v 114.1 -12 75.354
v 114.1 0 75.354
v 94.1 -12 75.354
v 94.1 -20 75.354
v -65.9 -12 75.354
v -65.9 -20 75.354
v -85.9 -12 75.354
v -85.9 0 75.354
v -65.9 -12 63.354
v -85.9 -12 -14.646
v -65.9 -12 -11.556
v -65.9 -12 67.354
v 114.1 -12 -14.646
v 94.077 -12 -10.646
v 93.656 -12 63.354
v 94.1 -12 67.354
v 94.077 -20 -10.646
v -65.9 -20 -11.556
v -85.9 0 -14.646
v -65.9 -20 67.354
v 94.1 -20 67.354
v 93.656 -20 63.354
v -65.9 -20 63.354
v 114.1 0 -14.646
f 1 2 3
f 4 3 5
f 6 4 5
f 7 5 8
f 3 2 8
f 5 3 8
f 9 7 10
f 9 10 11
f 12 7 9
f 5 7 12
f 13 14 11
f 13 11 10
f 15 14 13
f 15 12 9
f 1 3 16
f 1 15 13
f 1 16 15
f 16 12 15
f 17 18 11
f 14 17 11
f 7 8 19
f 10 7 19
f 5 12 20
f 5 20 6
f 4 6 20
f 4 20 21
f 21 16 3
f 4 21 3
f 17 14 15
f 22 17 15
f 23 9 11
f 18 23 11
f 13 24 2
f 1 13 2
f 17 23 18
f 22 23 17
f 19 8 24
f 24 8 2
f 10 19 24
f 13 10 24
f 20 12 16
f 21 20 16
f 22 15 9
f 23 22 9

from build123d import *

# Parameters (mm, degrees)
F0_W     = 160
F0_H     = 8
F1_DEPTH = 12
F2_DEPTH = 20
F3_W     = 8
F3_H     = 4
F4_DEPTH = 159.9984091469


with BuildPart() as f1:
    # F0 (on Front) → F1 (new body)
    with BuildSketch(Plane.XZ):
        Polygon((-65.9003738091, 63.3540591938), (-65.9003738091, -14.6459408062), (94.0996261909, -14.6459408062), (93.6557352543, 63.3540591938), align=None)
        Polygon((-85.9003738091, -14.6459408062), (-65.9003738091, -14.6459408062), (-65.9003738091, 63.3540591938), (93.6557352543, 63.3540591938), (94.0996261909, -14.6459408062), (114.0996261909, -14.6459408062), (114.0996261909, 75.3540591938), (94.0996261909, 75.3540591938), (94.0996261909, 67.3540591938), (-65.9003738091, 67.3540591938), (-65.9003738091, 75.3540591938), (-85.9003738091, 75.3540591938), align=None)
        with Locations((14.0996261909, 71.3540591938)):
            Rectangle(F0_W, F0_H)
    extrude(amount=F1_DEPTH)

    # F0 (on Front) → F2 (join)
    with BuildSketch(Plane.XZ):
        with Locations((14.0996261909, 71.3540591938)):
            Rectangle(F0_W, F0_H)
        Polygon((-65.9003738091, 63.3540591938), (-65.9003738091, -14.6459408062), (94.0996261909, -14.6459408062), (93.6557352543, 63.3540591938), align=None)
    extrude(amount=F2_DEPTH)

    # F3 (on face) → F4 (cut, through all)
    with BuildSketch(Plane(origin=(94.0132327131, 0, 0.5350207939), x_dir=(0, 1, 0), z_dir=(0.9999838072, 0, 0.0056908173))):
        with Locations((-16, -13.1812074268)):
            Rectangle(F3_W, F3_H)
    extrude(amount=-F4_DEPTH, mode=Mode.SUBTRACT)


solid = f1.part
